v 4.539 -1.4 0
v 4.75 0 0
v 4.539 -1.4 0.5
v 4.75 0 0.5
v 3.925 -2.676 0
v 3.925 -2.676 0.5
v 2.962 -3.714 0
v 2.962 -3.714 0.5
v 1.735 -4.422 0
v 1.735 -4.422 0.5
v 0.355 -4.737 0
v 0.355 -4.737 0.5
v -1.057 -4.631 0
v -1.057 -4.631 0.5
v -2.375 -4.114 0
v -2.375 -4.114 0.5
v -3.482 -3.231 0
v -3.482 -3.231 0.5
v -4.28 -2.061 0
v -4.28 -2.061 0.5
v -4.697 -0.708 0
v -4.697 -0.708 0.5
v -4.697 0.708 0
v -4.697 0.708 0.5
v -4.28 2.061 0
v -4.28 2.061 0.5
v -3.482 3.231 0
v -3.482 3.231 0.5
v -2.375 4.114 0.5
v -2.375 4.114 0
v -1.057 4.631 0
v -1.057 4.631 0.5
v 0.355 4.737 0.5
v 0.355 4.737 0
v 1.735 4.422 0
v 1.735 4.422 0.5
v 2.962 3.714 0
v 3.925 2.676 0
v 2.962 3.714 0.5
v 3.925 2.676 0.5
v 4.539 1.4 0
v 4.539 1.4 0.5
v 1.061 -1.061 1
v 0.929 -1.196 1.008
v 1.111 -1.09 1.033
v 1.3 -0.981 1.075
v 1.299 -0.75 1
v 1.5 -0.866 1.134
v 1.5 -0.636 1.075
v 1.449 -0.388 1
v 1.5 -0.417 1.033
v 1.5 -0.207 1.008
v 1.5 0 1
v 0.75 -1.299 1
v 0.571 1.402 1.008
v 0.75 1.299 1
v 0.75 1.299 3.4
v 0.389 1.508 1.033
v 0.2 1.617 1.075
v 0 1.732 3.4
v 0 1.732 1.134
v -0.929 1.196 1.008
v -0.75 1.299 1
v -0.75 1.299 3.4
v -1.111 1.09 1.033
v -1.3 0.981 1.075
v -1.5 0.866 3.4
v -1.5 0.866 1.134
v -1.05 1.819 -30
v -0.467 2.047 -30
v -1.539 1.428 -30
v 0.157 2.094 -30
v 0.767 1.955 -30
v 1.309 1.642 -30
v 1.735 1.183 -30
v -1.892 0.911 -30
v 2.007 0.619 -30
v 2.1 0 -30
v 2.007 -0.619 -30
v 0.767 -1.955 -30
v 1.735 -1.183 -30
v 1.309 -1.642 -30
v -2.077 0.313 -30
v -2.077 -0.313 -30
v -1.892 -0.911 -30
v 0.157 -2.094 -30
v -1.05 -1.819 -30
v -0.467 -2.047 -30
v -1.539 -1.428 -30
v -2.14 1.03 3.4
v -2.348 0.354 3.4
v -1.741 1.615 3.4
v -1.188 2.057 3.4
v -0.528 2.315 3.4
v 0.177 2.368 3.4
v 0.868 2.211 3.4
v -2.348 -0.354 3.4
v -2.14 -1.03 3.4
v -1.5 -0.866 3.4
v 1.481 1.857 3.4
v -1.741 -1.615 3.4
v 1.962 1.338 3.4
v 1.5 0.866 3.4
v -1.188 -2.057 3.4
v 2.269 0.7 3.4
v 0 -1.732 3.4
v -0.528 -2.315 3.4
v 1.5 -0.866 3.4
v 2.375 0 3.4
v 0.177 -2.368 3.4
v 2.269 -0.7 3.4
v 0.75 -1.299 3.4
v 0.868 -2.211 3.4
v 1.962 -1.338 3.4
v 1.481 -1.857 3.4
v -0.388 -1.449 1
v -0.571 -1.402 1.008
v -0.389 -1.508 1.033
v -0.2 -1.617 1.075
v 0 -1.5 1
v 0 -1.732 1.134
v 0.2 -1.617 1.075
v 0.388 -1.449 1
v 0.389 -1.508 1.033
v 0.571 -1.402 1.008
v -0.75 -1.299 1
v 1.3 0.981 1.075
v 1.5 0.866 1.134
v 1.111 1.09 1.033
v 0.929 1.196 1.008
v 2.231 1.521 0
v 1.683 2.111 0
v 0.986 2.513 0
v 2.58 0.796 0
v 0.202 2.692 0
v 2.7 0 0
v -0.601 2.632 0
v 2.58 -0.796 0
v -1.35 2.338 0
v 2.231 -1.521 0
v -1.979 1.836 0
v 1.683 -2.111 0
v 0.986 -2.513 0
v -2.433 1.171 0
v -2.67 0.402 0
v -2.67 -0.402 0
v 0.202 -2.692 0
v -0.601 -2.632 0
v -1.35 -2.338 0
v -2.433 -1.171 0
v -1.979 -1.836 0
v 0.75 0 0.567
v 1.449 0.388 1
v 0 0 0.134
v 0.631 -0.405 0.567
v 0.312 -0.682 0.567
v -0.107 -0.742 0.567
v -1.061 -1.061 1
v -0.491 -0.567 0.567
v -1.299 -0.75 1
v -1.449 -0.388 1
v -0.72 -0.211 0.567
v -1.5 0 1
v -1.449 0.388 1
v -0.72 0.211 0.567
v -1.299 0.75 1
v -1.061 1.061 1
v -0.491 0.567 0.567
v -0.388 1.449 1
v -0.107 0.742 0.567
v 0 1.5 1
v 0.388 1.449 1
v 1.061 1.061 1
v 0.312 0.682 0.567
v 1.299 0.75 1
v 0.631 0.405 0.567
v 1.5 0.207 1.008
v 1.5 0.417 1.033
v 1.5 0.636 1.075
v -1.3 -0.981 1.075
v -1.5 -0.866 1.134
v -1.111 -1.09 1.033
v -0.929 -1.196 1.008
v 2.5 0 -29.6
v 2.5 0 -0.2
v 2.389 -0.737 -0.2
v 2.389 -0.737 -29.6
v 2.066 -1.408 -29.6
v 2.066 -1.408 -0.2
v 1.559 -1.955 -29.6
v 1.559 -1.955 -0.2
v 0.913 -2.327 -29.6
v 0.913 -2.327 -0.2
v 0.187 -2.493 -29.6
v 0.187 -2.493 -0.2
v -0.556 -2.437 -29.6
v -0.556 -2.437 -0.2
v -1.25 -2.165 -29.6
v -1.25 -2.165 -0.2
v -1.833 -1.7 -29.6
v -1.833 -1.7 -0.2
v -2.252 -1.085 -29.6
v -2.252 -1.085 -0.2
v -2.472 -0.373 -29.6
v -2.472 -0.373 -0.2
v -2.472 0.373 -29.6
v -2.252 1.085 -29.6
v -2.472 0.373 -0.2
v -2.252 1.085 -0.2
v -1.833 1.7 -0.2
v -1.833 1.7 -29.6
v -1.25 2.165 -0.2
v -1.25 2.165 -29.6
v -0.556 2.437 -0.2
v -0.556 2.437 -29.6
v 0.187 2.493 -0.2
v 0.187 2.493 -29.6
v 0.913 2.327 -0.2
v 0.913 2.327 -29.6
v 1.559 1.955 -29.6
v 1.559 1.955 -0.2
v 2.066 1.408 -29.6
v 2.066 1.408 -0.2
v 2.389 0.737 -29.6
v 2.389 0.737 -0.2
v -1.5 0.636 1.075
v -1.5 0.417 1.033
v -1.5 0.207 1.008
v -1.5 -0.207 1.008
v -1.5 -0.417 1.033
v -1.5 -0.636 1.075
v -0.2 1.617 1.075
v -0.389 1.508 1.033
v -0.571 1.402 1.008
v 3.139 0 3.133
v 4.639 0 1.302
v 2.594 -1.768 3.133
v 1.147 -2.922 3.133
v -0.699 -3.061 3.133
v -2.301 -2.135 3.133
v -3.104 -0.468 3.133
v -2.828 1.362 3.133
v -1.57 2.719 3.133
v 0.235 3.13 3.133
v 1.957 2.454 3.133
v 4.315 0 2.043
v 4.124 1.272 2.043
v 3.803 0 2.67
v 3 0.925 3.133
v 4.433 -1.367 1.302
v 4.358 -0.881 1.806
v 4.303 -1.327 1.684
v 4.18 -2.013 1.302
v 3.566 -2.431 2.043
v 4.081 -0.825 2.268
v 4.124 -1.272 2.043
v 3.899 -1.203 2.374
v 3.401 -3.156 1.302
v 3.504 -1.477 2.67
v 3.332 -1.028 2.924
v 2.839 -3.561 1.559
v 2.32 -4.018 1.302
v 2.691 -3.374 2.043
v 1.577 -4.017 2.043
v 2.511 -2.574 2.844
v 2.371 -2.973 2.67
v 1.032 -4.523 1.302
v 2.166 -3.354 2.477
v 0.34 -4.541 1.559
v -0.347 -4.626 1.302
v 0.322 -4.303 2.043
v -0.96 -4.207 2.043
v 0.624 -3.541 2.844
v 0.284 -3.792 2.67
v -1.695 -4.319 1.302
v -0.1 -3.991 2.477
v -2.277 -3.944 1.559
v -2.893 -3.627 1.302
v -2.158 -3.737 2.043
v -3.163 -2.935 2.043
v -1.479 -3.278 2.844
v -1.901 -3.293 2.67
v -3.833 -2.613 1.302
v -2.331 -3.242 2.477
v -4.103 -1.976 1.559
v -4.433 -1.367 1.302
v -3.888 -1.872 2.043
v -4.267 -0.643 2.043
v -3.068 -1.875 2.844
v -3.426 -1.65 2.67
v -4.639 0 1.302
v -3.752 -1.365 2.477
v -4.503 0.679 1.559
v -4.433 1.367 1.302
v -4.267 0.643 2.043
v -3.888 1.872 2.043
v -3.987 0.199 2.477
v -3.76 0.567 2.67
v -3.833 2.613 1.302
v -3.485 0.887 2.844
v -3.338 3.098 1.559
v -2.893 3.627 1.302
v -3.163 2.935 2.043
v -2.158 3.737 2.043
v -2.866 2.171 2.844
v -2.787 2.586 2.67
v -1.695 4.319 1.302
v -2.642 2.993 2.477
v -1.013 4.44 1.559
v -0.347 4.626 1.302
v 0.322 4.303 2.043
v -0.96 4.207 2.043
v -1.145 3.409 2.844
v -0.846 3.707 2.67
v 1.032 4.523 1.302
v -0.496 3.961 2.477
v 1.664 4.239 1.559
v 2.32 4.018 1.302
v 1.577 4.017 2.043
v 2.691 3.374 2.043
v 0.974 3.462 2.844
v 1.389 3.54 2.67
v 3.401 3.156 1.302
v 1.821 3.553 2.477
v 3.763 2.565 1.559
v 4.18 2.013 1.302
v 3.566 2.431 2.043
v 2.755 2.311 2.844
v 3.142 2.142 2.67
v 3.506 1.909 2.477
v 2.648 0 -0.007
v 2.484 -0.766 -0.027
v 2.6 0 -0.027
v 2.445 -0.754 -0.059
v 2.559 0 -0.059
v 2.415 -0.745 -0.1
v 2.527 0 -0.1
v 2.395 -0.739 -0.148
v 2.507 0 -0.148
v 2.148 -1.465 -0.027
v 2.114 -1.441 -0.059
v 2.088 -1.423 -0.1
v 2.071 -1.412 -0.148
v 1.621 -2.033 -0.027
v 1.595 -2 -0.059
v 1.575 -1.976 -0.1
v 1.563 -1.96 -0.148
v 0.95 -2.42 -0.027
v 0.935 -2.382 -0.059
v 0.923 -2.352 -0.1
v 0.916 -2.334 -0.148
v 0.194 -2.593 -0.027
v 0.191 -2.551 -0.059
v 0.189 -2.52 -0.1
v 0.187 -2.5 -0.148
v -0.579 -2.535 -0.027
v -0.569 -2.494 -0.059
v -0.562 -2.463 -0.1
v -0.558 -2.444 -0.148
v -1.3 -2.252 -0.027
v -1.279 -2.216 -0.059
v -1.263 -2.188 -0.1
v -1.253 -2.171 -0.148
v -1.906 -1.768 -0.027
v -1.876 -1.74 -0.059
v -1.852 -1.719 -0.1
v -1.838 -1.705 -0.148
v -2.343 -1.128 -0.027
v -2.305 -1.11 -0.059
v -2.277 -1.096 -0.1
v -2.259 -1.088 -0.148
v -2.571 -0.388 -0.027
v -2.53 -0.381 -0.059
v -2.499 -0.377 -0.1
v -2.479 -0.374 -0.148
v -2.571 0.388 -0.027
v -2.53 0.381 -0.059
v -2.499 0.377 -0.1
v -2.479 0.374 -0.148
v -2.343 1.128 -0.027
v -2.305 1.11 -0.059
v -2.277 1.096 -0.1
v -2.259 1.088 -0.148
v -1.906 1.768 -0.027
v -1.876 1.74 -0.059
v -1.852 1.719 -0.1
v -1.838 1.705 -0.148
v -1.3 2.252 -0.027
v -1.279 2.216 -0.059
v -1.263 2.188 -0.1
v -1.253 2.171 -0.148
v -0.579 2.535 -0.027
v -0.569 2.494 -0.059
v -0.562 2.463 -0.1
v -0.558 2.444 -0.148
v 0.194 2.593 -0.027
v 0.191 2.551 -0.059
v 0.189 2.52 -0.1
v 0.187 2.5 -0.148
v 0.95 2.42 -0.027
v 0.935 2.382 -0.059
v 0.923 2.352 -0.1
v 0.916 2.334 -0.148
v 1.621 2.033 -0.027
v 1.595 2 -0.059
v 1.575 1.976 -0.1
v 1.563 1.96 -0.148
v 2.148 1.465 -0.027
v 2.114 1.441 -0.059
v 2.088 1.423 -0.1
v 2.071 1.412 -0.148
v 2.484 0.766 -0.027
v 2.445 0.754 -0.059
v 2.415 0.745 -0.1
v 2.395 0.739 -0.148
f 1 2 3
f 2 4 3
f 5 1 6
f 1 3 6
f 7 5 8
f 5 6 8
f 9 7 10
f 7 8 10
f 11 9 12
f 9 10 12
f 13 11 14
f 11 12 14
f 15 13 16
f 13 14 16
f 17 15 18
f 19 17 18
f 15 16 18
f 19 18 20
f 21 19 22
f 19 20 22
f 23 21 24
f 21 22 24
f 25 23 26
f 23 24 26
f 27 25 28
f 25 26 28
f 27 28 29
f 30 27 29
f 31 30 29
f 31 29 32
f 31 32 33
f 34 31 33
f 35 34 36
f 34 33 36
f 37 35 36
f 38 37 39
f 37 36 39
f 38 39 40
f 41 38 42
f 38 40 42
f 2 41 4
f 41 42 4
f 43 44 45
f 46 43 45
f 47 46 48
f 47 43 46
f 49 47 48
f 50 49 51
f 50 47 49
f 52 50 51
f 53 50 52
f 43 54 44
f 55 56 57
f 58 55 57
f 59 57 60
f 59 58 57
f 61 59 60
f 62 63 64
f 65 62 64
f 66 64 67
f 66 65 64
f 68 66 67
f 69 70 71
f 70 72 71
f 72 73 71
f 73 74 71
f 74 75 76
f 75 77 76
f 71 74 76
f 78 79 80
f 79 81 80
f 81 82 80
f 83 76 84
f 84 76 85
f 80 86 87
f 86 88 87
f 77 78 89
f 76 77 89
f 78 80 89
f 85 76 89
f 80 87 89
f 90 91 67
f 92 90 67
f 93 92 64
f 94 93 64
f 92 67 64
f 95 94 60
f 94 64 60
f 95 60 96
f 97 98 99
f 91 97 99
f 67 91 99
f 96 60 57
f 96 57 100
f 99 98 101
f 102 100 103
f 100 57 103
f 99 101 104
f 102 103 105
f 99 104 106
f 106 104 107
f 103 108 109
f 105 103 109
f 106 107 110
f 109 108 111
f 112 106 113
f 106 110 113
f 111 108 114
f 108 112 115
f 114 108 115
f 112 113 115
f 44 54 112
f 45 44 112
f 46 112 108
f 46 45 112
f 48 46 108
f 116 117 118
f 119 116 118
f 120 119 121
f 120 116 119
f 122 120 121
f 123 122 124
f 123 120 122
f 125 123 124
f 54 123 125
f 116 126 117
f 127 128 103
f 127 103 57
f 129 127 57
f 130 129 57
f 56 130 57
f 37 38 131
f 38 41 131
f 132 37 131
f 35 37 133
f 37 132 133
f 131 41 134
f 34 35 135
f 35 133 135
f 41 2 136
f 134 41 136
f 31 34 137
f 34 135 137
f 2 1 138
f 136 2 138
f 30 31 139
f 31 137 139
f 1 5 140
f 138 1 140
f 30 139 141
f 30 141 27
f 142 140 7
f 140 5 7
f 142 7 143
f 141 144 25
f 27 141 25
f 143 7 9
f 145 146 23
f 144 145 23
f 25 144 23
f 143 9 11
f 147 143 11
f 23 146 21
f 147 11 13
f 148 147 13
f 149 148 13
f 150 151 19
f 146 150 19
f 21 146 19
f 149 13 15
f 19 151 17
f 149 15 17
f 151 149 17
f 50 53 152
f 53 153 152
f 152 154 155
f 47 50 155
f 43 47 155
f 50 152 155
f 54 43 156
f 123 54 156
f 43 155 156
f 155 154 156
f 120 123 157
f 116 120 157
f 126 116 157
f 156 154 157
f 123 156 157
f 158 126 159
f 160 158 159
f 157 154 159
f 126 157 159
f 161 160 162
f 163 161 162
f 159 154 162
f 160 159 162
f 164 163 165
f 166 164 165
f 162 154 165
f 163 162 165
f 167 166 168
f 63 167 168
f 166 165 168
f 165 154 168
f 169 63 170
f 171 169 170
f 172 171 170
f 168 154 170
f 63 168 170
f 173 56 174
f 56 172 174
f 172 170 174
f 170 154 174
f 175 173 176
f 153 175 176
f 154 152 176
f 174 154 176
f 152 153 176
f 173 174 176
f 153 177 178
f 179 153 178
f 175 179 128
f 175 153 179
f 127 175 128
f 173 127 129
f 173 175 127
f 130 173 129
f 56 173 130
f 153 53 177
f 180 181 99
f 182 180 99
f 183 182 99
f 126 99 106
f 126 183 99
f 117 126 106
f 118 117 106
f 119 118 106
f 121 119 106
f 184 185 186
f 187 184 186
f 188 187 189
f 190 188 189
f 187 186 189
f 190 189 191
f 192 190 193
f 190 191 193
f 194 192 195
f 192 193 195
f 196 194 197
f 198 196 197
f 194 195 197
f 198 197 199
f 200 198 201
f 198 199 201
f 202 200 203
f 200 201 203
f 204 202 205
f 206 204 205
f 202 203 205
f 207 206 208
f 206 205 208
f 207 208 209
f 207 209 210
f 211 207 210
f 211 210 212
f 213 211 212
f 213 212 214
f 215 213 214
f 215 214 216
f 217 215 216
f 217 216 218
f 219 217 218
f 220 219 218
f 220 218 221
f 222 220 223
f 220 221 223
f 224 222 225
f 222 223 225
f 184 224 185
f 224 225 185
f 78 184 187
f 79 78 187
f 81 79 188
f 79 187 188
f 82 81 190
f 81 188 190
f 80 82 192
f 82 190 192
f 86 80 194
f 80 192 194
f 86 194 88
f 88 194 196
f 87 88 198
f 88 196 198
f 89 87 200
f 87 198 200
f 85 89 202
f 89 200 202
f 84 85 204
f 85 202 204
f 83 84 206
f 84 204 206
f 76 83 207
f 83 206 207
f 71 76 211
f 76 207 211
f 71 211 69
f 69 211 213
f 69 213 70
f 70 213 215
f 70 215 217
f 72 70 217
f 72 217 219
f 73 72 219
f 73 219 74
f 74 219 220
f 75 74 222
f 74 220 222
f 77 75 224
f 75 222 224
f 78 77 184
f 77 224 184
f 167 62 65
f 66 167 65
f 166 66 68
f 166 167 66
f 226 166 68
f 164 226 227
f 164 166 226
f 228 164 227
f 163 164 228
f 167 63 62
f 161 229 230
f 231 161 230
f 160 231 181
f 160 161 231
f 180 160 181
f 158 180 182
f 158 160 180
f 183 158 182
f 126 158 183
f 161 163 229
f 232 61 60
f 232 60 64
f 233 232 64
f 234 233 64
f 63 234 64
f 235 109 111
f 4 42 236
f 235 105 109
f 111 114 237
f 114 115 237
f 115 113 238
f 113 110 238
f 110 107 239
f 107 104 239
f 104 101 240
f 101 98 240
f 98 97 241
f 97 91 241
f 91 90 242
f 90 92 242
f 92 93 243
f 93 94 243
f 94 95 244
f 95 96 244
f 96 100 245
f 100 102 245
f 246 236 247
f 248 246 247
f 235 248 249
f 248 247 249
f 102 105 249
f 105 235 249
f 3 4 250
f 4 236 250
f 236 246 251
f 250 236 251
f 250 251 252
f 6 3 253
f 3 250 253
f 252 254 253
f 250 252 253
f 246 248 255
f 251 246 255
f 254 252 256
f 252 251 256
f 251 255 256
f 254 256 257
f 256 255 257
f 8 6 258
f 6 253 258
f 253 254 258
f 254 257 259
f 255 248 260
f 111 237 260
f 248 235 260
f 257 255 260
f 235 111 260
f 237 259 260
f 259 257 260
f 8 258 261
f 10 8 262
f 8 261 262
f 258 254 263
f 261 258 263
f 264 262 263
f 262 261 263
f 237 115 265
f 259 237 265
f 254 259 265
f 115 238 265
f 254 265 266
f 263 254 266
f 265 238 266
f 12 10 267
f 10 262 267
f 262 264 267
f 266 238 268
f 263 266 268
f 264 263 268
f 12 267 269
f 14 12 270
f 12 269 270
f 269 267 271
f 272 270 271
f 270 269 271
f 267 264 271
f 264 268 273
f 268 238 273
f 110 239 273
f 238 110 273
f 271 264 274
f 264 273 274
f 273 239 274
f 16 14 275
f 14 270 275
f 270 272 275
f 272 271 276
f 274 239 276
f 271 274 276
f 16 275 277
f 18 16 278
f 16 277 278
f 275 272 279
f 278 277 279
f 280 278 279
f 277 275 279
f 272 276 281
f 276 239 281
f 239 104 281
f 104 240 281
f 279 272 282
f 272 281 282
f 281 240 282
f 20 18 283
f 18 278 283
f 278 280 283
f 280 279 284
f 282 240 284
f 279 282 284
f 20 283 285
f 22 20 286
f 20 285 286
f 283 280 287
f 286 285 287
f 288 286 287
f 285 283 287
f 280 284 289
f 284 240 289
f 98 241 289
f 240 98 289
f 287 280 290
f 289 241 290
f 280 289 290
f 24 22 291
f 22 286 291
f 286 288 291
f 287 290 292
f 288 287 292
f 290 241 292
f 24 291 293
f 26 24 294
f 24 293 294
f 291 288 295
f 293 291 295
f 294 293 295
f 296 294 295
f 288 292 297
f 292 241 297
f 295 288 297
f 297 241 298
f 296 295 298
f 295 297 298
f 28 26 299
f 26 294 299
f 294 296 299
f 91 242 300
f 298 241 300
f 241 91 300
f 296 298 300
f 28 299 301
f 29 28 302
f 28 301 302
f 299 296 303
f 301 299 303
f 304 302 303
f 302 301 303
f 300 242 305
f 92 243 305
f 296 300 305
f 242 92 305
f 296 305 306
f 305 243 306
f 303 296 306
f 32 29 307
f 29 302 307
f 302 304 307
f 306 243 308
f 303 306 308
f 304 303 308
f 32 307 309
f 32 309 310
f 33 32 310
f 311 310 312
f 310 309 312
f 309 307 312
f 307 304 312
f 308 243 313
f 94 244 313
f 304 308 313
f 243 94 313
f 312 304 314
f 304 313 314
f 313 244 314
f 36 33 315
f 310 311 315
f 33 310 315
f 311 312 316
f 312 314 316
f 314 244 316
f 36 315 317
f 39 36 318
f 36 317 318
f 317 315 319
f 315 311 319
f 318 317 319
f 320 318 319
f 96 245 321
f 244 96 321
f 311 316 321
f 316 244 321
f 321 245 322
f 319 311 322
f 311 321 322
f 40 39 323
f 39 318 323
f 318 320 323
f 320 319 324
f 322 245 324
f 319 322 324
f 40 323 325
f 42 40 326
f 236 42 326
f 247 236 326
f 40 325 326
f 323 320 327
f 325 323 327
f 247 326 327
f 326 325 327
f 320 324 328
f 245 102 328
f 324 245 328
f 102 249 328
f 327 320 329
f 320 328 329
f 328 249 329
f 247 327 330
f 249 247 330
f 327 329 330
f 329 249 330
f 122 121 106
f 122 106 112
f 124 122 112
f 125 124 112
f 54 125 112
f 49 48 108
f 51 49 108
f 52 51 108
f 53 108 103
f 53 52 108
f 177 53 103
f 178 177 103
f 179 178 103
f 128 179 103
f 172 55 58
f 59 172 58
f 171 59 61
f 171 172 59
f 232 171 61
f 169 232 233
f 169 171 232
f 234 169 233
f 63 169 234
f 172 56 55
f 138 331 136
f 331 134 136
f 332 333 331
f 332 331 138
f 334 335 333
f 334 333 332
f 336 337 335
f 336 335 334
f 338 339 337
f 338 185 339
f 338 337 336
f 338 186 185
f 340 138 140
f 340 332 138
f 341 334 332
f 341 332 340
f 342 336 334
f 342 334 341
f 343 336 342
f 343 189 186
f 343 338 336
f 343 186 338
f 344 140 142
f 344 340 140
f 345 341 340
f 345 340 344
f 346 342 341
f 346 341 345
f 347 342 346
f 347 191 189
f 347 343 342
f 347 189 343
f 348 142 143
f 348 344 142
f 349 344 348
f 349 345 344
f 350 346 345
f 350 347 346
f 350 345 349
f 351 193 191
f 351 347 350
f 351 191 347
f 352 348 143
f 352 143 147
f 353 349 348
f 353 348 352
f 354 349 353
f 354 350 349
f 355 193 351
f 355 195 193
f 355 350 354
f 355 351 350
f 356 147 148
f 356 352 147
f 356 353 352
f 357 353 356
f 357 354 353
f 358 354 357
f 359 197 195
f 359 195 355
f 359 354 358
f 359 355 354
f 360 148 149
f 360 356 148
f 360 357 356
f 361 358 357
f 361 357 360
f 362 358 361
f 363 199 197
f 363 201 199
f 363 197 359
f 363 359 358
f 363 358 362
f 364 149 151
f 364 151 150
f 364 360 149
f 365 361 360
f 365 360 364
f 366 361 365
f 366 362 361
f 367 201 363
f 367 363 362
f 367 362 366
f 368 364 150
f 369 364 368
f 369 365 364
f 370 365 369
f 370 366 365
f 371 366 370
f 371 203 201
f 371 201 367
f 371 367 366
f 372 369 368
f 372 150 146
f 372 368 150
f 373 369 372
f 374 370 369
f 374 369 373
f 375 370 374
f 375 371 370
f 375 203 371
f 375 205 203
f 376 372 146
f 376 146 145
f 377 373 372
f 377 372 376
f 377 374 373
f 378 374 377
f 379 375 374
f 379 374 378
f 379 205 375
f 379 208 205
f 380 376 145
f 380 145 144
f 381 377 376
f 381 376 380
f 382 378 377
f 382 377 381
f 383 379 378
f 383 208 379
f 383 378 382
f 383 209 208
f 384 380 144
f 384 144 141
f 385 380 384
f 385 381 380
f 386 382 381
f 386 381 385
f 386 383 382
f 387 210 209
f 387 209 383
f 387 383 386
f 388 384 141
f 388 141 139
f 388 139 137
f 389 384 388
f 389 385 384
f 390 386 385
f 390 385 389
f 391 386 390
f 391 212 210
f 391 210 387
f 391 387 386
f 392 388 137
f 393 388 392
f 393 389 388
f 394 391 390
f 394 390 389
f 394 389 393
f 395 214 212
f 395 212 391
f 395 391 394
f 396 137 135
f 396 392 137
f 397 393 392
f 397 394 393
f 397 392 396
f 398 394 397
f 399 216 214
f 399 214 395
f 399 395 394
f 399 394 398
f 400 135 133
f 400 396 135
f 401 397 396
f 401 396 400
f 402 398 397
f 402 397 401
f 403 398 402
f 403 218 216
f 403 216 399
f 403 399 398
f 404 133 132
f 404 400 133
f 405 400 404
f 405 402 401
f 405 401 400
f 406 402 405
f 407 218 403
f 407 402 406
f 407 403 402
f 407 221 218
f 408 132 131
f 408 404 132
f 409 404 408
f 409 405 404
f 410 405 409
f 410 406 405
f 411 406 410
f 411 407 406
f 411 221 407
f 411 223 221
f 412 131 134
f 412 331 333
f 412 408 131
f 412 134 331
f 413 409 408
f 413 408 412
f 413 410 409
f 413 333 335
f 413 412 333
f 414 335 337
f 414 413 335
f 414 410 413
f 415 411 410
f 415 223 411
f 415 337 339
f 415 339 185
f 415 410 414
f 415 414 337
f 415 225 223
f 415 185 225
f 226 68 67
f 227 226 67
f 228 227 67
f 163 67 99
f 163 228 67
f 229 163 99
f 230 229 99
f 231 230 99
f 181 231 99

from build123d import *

# Parameters (mm, degrees)
CHAMFER1_SIZE      = 0.4
CUT_EXTRUDE1_START = -2.4000001
CUT_EXTRUDE1_DEPTH = 3.4000001
FILLET1_R          = 0.2


with BuildPart() as part:
    # Sketch1 → Revolve1 (revolve)
    with BuildSketch(Plane(origin=(0, 0, 0), x_dir=(0, 0, -1), z_dir=(1, 0, 0)), mode=Mode.PRIVATE) as revolve1_sk:
        with BuildLine():
            Line((30, 0), (30, 2.5))
            Line((30, 2.5), (0, 2.5))
            Line((0, 2.5), (0, 4.75))
            Line((0, 4.75), (-0.5, 4.75))
            ThreePointArc((-0.5, 4.75), (-2.374208166, 4.080480498), (-3.4, 2.375))
            Line((-3.4, 2.375), (-3.4, 0))
            Line((-3.4, 0), (30, 0))
        make_face()
    revolve(revolve1_sk.sketch.rotate(Axis((0, 0, 30.809969789), (0, 0, -1)), 90), axis=Axis((0, 0, 30.809969789), (0, 0, -1)))

    # Chamfer1
    chamfer1_edges = [part.edges().sort_by_distance(p)[0] for p in [
        (-2.5, 0, -30),
    ]]
    chamfer(chamfer1_edges, length=CHAMFER1_SIZE)

    # Sketch2 → Cut-Revolve1 (revolve, cut)
    with BuildSketch(Plane(origin=(0, 0, 0), x_dir=(0, 0, -1), z_dir=(1, 0, 0)), mode=Mode.PRIVATE) as cut_revolve1_sk:
        Polygon((-3.4, 0), (-3.4, 1.5), (-1, 1.5), (-0.133974596, 0), align=None)
    revolve(cut_revolve1_sk.sketch.rotate(Axis((0, 0, 2.452500839), (0, 0, -1)), 90), axis=Axis((0, 0, 2.452500839), (0, 0, -1)), mode=Mode.SUBTRACT)

    # Cut-Extrude1: read off the stored shape, not the designer's step
    # Cut-Extrude1 outline → Cut-Extrude1 (cut)
    with BuildSketch(Plane.XY.offset(3.4).offset(CUT_EXTRUDE1_START)):
        with BuildLine():
            Line((1.5, 0), (1.5, 0.866025404))
            Line((1.5, 0.866025404), (0.750000011, 1.299038099))
            ThreePointArc((0.750000011, 1.299038099), (1.299038109, 0.749999994), (1.5, 0))
        make_face()
        with BuildLine():
            ThreePointArc((-0.749999993, 1.29903811), (1e-08, 1.5), (0.750000011, 1.299038099))
            Line((0.750000011, 1.299038099), (0, 1.732050808))
            Line((0, 1.732050808), (-0.749999993, 1.29903811))
        make_face()
        with BuildLine():
            Line((1.5, -0.866025404), (1.5, 0))
            ThreePointArc((1.5, 0), (1.299038107, -0.749999997), (0.750000005, -1.299038103))
            Line((0.750000005, -1.299038103), (1.5, -0.866025404))
        make_face()
        with BuildLine():
            ThreePointArc((-1.5, 0), (-1.299038104, 0.750000003), (-0.749999993, 1.29903811))
            Line((-0.749999993, 1.29903811), (-1.5, 0.866025404))
            Line((-1.5, 0.866025404), (-1.5, 0))
        make_face()
        with BuildLine():
            Line((0, -1.732050808), (0.750000005, -1.299038103))
            ThreePointArc((0.750000005, -1.299038103), (3e-09, -1.5), (-0.75, -1.299038106))
            Line((-0.75, -1.299038106), (0, -1.732050808))
        make_face()
        with BuildLine():
            ThreePointArc((-0.75, -1.299038106), (-1.299038106, -0.75), (-1.5, 0))
            Line((-1.5, 0), (-1.5, -0.866025404))
            Line((-1.5, -0.866025404), (-0.75, -1.299038106))
        make_face()
    extrude(amount=CUT_EXTRUDE1_DEPTH, mode=Mode.SUBTRACT)

    # Cut-Extrude1 2 outline → Cut-Extrude1 2 (revolve)
    with BuildSketch(Plane.XZ):
        Polygon((1.732050837, 1.133974613), (1.499999957, 0.999999975), (1.732050808, 0.9999999), align=None)
    revolve(axis=Axis((0, 0, 0), (0, 0, 1)))

    # Fillet1
    fillet1_edges = [part.edges().sort_by_distance(p)[0] for p in [
        (-2.5, 0, 0),
    ]]
    fillet(fillet1_edges, radius=FILLET1_R)


solid = part.part
